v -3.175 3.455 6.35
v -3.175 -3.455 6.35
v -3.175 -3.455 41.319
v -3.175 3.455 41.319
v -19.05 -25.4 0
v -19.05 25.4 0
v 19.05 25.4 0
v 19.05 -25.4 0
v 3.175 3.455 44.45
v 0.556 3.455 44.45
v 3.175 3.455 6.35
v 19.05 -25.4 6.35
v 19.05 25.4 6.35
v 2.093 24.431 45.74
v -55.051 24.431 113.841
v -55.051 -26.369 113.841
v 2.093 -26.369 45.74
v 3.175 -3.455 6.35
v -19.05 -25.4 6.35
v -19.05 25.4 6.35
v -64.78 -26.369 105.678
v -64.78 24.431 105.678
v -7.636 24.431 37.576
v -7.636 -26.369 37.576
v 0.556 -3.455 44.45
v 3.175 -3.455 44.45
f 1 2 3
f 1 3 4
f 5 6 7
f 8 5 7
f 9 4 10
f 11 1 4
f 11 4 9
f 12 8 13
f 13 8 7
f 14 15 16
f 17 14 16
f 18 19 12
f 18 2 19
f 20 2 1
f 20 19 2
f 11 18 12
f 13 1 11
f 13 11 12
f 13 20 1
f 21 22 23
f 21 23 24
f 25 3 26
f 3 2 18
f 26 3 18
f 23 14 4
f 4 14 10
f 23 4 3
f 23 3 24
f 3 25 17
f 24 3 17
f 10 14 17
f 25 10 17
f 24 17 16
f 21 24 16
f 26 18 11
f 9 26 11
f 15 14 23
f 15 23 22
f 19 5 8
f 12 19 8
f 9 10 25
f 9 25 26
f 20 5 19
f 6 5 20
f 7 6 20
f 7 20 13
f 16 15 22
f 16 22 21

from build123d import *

# Parameters (mm, degrees)
F0_W     = 38.1
F0_H     = 50.8
F1_DEPTH = 6.35
F2_W     = 6.35
F2_H     = 6.910296
F3_DEPTH = 38.1
F6_W     = 50.8
F6_H     = 88.9
F7_DEPTH = 12.7


with BuildPart() as f1:
    # F0 (on Top) → F1 (new body)
    with BuildSketch(Plane.XY):
        Rectangle(F0_W, F0_H)
    extrude(amount=F1_DEPTH)

    # F2 (on face) → F3 (join)
    with BuildSketch(Plane.XY.offset(6.35)):
        Rectangle(F2_W, F2_H)
    extrude(amount=F3_DEPTH)

    # F6 (on face) → F7 (join)
    with BuildSketch(Plane(origin=(23.750519, 0, 19.929052), x_dir=(0, -1, 0), z_dir=(-0.766044, 0, -0.642788))):
        with Locations((0.969407, 78.143354)):
            Rectangle(F6_W, F6_H)
    extrude(amount=F7_DEPTH)


solid = f1.part
